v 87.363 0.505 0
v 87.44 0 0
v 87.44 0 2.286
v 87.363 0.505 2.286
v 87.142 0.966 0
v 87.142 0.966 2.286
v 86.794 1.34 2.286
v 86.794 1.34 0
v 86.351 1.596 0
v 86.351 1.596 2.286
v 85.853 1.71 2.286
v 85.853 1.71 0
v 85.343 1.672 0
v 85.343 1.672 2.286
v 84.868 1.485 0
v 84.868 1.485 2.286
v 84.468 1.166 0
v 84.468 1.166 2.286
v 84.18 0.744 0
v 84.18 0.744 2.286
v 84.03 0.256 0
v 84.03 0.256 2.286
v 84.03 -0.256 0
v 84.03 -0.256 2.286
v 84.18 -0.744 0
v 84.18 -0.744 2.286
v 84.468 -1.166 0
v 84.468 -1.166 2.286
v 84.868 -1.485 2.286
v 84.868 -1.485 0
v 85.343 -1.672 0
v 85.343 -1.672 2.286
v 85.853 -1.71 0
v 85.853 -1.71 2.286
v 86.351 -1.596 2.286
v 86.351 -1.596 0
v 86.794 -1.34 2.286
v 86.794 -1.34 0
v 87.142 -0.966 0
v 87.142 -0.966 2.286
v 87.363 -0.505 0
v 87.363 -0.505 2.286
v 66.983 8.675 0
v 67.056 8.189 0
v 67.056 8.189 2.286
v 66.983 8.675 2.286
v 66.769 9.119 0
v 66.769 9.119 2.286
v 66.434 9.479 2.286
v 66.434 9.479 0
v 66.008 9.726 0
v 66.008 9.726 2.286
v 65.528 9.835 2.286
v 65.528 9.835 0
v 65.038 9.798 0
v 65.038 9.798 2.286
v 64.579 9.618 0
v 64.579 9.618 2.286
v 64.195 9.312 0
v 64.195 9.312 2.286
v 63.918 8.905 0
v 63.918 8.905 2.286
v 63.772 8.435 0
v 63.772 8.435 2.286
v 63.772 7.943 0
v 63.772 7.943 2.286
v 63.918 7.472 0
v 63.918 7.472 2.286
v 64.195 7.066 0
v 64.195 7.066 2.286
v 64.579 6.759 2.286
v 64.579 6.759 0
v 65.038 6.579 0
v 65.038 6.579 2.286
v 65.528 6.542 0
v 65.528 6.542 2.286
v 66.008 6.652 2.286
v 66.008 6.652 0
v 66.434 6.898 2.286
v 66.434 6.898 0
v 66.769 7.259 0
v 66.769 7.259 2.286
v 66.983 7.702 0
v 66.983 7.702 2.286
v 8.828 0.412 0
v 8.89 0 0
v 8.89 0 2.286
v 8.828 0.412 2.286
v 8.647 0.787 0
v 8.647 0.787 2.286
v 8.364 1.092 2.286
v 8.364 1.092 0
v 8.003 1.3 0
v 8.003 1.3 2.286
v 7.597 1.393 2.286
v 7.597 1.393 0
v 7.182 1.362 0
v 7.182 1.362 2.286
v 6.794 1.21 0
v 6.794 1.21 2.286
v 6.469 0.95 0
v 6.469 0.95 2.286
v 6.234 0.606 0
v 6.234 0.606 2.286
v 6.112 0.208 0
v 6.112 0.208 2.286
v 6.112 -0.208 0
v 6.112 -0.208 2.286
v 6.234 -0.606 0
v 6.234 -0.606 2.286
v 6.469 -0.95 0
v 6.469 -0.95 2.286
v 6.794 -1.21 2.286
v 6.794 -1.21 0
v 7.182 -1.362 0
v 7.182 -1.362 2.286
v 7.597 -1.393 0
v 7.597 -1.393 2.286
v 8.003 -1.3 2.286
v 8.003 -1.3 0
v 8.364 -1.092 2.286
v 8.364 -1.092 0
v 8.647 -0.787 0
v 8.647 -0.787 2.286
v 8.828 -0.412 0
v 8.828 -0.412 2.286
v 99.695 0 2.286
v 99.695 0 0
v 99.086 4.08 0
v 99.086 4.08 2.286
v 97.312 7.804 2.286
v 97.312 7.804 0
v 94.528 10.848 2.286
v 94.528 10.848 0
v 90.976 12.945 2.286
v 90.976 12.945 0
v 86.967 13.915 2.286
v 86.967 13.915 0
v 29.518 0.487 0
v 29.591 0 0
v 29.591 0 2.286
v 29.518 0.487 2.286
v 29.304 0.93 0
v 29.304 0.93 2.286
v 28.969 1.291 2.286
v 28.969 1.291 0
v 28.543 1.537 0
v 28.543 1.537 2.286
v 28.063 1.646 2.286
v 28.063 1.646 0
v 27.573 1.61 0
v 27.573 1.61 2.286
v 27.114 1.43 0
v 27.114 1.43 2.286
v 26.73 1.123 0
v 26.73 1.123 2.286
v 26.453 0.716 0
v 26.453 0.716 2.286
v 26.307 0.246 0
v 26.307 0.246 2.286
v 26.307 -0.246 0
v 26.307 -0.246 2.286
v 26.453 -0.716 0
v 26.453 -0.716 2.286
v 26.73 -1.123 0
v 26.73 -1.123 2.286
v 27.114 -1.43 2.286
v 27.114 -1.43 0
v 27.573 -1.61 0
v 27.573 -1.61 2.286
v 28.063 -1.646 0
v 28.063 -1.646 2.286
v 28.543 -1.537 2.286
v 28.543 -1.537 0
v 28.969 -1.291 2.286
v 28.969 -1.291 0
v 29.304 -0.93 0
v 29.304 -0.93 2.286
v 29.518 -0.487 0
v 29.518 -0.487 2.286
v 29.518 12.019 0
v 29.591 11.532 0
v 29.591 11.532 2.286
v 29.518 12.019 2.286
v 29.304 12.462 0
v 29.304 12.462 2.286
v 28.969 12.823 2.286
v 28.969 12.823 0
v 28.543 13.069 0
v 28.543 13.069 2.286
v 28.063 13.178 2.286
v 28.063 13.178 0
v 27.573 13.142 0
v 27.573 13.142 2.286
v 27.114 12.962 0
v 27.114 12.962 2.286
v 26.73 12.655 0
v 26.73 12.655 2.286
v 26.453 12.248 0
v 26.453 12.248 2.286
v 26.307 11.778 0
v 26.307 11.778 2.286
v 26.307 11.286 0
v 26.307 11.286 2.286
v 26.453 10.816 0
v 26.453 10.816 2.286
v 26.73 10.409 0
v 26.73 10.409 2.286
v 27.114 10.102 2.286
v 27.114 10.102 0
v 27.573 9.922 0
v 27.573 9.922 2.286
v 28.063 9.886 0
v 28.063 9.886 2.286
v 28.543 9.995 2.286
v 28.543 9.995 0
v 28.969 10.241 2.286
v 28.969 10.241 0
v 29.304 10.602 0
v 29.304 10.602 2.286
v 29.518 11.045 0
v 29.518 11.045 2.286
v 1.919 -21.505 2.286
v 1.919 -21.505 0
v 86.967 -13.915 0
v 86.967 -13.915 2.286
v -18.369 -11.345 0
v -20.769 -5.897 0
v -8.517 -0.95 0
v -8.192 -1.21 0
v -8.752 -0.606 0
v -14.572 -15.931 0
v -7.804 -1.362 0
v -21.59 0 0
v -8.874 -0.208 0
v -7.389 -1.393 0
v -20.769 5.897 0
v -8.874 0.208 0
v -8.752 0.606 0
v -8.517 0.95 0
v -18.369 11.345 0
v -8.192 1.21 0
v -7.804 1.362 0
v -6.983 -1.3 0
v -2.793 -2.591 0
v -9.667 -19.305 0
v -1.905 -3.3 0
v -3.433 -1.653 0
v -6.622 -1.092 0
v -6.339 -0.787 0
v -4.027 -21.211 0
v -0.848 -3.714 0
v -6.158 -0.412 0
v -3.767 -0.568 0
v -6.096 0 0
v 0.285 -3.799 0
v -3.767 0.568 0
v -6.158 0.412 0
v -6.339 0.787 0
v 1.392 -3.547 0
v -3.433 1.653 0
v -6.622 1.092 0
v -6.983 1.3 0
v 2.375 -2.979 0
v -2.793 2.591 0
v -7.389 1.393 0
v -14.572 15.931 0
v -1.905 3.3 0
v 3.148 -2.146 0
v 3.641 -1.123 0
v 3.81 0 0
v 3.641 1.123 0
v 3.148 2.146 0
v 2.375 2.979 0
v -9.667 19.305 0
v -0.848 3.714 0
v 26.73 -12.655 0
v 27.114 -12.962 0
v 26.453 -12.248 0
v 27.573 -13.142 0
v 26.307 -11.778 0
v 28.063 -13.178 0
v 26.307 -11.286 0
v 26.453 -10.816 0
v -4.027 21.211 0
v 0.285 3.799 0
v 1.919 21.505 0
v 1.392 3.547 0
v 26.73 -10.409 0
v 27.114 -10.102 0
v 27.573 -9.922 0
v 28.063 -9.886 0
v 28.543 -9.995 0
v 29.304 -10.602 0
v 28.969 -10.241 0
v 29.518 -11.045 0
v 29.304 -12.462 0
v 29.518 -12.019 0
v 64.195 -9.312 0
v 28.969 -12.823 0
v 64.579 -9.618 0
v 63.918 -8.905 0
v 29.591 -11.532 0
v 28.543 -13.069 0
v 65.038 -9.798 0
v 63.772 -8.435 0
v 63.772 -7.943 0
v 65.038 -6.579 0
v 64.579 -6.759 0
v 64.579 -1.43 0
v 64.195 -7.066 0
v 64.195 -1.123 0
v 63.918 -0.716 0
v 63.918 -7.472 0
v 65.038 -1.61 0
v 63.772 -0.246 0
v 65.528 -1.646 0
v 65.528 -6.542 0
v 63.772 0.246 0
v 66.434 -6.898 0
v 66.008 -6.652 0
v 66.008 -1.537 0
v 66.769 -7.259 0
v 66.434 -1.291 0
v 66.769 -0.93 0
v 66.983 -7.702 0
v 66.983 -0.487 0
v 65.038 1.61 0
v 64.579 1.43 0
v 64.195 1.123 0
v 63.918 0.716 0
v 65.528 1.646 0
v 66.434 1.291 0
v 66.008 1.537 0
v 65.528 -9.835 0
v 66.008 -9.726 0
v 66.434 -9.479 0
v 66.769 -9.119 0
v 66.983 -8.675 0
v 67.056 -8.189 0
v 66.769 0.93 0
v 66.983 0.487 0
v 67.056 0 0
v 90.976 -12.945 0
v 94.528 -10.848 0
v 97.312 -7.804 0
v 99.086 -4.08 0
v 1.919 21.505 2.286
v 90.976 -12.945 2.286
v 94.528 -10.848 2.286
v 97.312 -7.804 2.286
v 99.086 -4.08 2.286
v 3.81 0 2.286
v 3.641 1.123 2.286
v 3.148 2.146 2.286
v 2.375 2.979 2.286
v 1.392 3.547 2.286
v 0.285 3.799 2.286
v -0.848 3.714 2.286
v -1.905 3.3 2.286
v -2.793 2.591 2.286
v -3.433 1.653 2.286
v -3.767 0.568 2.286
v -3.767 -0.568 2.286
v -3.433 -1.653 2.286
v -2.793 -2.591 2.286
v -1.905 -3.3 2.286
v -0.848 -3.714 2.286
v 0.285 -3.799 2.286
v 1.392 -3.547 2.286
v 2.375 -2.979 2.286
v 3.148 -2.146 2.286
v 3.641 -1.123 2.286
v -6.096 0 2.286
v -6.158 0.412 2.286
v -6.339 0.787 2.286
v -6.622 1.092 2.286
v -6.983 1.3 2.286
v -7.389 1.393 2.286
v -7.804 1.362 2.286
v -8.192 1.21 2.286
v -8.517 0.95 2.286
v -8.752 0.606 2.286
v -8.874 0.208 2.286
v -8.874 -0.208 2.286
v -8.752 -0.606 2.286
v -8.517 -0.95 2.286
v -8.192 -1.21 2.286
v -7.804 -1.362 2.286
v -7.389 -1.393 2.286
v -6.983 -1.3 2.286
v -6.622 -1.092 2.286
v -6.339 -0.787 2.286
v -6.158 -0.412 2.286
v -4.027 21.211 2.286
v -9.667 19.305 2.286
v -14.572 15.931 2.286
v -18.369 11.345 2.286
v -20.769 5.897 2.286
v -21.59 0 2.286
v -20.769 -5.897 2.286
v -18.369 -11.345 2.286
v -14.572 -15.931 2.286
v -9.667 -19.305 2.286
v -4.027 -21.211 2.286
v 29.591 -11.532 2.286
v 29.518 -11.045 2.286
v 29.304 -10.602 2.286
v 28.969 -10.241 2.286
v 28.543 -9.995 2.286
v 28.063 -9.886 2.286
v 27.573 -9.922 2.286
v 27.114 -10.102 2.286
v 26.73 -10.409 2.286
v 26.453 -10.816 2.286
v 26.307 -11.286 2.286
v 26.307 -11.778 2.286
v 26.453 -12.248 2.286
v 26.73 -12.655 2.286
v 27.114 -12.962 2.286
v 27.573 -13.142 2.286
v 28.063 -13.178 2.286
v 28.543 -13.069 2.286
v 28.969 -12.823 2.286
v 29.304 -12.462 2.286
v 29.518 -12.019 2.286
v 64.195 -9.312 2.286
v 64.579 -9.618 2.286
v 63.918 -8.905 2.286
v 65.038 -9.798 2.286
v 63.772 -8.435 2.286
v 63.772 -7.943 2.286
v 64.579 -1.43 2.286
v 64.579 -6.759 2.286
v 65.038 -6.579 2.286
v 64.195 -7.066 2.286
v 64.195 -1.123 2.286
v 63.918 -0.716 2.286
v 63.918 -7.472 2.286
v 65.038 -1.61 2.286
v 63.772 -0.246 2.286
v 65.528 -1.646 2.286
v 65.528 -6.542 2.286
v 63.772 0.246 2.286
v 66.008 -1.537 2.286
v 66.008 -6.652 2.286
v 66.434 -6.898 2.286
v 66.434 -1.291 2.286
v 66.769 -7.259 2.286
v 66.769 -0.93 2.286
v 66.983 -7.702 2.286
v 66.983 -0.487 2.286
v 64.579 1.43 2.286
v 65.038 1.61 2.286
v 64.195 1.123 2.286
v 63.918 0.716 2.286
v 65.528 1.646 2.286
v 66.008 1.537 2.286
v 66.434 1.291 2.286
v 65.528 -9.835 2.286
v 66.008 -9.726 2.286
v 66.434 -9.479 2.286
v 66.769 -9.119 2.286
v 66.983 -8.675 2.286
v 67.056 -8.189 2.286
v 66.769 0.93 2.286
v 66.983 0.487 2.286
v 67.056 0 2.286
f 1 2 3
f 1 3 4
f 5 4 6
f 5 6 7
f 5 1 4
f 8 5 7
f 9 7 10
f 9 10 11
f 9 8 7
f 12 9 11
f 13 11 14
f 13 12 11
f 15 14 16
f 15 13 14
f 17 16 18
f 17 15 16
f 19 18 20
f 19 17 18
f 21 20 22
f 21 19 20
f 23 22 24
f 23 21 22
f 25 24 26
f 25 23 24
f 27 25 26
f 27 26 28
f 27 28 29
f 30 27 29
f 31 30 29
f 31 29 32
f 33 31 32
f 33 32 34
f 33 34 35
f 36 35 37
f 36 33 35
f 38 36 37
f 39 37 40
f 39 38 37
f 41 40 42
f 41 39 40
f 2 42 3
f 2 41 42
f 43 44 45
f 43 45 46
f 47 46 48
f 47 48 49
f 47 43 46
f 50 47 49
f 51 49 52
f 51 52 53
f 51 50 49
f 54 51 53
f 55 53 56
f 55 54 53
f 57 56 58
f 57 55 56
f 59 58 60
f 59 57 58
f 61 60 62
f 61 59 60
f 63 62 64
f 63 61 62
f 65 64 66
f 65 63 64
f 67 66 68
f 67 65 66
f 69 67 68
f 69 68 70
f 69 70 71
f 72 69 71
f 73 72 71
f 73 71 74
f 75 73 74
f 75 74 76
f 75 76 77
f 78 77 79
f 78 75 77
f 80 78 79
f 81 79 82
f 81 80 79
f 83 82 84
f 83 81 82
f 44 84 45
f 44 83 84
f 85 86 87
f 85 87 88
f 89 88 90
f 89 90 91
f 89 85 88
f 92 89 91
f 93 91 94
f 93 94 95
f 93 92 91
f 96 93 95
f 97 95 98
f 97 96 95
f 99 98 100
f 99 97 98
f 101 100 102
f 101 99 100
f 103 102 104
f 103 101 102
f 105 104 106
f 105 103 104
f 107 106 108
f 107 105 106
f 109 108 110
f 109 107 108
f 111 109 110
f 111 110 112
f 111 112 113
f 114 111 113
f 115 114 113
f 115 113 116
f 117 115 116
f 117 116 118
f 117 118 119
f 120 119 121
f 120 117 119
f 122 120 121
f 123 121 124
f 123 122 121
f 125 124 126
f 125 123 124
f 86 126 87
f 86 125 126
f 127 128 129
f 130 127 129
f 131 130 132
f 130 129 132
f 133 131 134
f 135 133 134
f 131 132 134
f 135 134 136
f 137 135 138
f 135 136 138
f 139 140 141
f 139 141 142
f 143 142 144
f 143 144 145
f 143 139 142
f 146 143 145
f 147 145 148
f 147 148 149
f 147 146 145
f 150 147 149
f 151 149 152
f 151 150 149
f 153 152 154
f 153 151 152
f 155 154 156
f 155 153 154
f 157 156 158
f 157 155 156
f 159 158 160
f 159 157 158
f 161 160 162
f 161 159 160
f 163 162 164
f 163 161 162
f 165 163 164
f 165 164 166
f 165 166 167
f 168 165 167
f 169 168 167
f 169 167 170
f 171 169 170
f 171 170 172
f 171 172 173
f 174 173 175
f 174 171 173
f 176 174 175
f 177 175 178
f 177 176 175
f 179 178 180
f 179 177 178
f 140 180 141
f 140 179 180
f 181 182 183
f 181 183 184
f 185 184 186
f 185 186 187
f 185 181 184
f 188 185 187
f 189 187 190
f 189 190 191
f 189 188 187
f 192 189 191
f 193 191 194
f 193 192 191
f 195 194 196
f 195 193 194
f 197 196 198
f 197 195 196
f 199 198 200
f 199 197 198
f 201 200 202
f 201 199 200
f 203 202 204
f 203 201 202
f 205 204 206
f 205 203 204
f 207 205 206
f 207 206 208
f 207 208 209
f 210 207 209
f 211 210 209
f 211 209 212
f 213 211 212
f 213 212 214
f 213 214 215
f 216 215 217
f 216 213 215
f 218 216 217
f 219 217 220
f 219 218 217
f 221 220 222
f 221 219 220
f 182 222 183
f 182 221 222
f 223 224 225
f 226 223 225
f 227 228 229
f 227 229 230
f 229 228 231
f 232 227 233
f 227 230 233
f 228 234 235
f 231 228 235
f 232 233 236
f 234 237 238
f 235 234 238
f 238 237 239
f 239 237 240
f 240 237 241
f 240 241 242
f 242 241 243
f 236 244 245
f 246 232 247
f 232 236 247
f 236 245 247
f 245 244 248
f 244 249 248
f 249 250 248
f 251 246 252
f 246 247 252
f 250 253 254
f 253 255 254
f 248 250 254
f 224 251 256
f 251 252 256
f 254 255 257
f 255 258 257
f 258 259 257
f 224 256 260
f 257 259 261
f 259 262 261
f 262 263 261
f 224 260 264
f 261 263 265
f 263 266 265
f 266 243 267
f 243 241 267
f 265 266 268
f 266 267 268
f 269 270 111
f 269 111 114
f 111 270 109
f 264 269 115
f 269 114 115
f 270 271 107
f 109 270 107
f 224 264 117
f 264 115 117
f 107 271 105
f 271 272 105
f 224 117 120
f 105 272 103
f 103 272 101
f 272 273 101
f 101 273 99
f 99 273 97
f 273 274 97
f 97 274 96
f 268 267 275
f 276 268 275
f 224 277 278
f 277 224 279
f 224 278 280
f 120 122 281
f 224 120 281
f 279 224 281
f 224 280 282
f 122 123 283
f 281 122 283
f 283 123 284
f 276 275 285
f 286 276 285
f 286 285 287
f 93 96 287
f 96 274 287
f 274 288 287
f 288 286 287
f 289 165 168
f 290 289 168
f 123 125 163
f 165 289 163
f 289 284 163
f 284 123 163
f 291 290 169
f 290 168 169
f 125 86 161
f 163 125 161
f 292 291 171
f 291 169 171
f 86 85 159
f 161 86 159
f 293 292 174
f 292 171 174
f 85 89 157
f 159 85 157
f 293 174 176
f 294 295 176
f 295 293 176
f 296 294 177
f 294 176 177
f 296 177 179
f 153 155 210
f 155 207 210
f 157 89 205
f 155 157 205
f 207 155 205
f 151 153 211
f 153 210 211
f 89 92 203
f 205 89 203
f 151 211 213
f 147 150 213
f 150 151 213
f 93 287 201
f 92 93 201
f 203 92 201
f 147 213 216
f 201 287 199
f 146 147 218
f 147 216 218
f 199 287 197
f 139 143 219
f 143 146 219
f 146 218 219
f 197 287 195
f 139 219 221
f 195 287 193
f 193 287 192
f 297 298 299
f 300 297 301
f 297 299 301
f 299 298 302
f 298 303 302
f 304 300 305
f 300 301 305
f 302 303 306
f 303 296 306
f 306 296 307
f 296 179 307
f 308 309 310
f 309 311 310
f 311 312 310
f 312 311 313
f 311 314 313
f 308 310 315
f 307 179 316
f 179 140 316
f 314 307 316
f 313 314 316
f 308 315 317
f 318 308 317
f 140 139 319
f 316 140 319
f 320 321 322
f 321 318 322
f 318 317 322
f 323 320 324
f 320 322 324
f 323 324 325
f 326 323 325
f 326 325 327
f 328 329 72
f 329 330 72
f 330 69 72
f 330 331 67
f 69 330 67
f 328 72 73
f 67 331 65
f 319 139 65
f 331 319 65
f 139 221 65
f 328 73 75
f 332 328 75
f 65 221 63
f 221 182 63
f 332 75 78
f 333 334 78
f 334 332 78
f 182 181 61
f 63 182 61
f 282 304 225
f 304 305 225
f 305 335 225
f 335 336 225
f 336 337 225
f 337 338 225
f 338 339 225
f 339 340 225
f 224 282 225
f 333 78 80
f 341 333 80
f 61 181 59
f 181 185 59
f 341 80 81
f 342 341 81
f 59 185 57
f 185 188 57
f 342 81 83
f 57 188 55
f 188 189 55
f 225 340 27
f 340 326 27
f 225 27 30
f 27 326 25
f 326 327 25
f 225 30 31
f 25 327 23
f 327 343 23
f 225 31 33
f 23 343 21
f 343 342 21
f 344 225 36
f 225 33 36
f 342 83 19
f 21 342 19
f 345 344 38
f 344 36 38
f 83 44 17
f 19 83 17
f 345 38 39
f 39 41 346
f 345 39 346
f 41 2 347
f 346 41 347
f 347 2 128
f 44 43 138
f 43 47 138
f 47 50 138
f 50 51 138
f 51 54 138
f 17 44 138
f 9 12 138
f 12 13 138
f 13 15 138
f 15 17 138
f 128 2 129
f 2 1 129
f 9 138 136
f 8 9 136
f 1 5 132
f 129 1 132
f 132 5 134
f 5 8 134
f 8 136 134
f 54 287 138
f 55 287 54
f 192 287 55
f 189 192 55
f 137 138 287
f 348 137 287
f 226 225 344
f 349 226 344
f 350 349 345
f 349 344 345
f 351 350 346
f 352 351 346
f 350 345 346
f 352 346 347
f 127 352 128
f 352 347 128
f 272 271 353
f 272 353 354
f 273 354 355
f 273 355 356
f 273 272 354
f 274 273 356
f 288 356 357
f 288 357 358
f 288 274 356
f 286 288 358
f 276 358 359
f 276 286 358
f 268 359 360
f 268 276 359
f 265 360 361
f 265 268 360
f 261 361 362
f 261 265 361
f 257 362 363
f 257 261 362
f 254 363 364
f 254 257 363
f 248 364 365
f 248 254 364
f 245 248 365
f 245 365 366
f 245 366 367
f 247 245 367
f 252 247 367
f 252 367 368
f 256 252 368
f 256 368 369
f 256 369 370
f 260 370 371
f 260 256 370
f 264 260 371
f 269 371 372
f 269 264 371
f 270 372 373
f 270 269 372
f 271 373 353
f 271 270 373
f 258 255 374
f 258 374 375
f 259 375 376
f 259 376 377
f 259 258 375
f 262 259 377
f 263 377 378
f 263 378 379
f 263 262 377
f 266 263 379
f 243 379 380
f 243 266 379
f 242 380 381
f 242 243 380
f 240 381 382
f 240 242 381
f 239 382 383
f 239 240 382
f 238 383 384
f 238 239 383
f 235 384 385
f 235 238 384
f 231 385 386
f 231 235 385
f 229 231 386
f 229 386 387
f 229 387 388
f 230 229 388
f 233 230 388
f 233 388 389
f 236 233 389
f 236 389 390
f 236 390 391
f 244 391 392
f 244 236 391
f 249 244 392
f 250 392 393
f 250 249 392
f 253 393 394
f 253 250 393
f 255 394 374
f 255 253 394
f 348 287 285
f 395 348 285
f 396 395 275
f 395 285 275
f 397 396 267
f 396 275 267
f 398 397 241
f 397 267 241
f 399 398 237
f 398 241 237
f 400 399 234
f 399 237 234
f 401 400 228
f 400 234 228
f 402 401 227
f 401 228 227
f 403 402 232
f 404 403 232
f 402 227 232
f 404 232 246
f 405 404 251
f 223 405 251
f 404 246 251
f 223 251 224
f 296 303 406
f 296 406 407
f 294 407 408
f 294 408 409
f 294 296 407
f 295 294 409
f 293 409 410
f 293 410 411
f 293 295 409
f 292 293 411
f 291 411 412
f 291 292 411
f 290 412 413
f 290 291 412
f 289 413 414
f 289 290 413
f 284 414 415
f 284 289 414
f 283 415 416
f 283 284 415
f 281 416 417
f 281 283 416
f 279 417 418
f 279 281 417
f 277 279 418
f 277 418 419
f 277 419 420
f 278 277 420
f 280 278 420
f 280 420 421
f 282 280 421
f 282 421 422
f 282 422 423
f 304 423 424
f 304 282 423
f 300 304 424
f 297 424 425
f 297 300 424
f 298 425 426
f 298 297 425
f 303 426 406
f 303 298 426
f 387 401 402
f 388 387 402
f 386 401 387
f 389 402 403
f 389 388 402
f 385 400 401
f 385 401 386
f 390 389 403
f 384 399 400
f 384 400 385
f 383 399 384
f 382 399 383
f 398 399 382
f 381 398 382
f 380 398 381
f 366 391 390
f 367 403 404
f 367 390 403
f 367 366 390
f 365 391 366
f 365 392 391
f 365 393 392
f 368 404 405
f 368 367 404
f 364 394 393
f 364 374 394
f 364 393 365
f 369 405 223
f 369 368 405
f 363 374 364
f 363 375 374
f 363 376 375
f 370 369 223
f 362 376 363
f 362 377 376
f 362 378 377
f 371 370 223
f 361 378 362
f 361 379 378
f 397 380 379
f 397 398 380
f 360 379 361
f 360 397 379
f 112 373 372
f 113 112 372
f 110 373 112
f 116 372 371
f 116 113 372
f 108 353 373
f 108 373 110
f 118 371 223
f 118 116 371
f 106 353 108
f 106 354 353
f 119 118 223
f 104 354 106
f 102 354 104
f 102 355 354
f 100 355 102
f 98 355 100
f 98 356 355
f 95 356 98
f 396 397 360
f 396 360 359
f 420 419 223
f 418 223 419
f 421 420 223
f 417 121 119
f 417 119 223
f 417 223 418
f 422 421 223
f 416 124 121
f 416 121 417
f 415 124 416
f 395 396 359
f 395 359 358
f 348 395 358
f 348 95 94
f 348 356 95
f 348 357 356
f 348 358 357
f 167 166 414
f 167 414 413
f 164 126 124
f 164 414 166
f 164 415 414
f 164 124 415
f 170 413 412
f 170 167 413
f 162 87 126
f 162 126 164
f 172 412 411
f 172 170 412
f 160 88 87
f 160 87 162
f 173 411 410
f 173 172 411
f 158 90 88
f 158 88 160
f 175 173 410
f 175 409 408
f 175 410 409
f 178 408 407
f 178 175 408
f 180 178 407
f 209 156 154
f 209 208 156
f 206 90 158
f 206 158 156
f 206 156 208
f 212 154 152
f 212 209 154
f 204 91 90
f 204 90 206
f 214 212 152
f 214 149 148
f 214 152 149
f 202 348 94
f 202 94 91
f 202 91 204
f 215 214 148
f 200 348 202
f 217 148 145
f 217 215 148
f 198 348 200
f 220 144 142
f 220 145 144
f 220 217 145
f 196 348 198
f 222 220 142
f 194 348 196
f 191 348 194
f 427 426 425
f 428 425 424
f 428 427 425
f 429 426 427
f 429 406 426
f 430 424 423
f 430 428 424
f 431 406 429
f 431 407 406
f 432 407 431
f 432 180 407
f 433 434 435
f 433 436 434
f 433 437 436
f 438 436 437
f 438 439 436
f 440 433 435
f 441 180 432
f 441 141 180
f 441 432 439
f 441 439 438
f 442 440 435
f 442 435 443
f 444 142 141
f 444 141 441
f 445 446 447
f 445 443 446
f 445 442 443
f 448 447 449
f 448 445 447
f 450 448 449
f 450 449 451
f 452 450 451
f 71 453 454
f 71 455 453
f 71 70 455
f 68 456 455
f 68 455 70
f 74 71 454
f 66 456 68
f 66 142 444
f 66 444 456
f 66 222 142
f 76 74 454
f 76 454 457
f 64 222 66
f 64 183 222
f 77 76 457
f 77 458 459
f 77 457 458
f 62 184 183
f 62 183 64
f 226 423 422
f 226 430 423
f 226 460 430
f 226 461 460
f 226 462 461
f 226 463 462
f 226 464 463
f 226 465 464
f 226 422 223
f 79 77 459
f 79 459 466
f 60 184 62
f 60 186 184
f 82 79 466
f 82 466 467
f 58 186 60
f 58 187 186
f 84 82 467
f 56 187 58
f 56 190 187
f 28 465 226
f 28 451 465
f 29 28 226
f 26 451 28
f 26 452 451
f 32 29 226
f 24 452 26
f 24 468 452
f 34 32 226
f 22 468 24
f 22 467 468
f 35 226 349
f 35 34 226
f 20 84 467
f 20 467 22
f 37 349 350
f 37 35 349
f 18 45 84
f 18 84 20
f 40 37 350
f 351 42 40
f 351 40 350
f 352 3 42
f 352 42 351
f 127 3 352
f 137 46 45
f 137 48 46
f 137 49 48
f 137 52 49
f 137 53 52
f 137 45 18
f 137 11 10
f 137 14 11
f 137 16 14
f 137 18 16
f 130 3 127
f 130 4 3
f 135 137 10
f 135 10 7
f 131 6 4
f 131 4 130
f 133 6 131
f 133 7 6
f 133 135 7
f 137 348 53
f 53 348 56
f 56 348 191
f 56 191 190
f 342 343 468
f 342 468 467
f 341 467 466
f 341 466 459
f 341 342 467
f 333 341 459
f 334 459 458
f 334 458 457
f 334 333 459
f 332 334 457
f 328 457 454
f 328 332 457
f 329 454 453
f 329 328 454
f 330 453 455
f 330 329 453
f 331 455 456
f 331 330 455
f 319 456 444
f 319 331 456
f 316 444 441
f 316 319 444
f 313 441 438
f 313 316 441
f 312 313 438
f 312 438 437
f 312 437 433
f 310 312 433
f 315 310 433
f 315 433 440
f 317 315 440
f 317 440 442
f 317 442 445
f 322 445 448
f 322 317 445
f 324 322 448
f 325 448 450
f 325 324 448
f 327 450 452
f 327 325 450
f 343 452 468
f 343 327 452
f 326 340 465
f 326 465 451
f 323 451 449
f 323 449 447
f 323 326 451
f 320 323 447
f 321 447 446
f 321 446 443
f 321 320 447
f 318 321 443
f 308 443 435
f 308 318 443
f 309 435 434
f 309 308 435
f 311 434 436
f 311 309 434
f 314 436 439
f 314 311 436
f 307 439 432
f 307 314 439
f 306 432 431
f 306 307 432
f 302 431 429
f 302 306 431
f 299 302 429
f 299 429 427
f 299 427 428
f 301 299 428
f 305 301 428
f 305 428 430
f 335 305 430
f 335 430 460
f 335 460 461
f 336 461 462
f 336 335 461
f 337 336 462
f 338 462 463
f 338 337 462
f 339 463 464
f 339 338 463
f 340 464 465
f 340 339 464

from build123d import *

# Parameters (mm, degrees)
F0_R     = 1.397
F0_R_2   = 3.81
F0_R_3   = 1.651
F0_R_4   = 1.7145
F1_DEPTH = 2.286


with BuildPart() as f1:
    # F0 (on Top) → F1 (new body)
    with BuildSketch(Plane.XY):
        with BuildLine():
            ThreePointArc((1.919111, -21.504537), (15.930501, -14.572139), (21.59, 0))
            ThreePointArc((21.59, 0), (15.930501, 14.572139), (1.919111, 21.504537))
            ThreePointArc((1.919111, 21.504537), (-21.59, 0), (1.919111, -21.504537))
        make_face()
        with Locations((-7.493, 0)):
            Circle(F0_R, mode=Mode.SUBTRACT)
        Circle(F0_R_2, mode=Mode.SUBTRACT)
        with Locations((7.493, 0)):
            Circle(F0_R, mode=Mode.SUBTRACT)
        with BuildLine():
            ThreePointArc((1.919111, 21.504537), (15.930501, 14.572139), (21.59, 0))
            ThreePointArc((21.59, 0), (15.930501, -14.572139), (1.919111, -21.504537))
            Line((1.919111, -21.504537), (86.966778, -13.9147))
            ThreePointArc((86.966778, -13.9147), (71.755, 0), (86.966778, 13.9147))
            Line((86.966778, 13.9147), (1.919111, 21.504537))
        make_face()
        with Locations((27.94, -11.532094)):
            Circle(F0_R_3, mode=Mode.SUBTRACT)
        with Locations((65.405, -8.188637)):
            Circle(F0_R_3, mode=Mode.SUBTRACT)
        with Locations((27.94, 0)):
            Circle(F0_R_3, mode=Mode.SUBTRACT)
        with Locations((27.94, 11.532094)):
            Circle(F0_R_3, mode=Mode.SUBTRACT)
        with Locations((65.405, 0)):
            Circle(F0_R_3, mode=Mode.SUBTRACT)
        with Locations((65.405, 8.188637)):
            Circle(F0_R_3, mode=Mode.SUBTRACT)
        with BuildLine():
            ThreePointArc((99.695, 0), (96.032971, 9.429031), (86.966778, 13.9147))
            ThreePointArc((86.966778, 13.9147), (71.755, 0), (86.966778, -13.9147))
            ThreePointArc((86.966778, -13.9147), (96.032971, -9.429031), (99.695, 0))
        make_face()
        with Locations((85.725, 0)):
            Circle(F0_R_4, mode=Mode.SUBTRACT)
    extrude(amount=F1_DEPTH)


solid = f1.part
